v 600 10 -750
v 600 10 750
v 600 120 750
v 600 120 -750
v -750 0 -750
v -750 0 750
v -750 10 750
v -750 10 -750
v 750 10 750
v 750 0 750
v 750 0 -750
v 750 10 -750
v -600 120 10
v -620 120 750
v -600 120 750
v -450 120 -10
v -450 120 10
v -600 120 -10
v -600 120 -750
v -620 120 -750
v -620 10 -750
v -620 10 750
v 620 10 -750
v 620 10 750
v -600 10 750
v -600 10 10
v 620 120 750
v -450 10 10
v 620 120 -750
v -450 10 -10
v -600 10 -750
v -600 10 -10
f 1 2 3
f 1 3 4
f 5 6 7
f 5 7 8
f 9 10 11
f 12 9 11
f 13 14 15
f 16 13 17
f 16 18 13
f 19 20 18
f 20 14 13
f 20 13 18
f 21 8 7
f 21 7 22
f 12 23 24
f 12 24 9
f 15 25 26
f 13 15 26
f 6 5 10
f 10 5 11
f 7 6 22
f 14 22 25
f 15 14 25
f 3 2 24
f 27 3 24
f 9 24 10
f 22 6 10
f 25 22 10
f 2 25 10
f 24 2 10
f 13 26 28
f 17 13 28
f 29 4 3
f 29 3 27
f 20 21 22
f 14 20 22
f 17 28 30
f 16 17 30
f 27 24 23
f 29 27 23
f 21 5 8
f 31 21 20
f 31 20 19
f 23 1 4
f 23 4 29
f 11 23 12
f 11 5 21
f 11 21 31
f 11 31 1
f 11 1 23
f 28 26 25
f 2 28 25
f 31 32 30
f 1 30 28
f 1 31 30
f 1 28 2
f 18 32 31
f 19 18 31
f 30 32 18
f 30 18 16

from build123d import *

# Parameters (mm, degrees)
SKETCH2_W           = 1500
SKETCH2_H           = 1500
BOSS_EXTRUDE1_DEPTH = 10
SKETCH3_W           = 150
SKETCH3_H           = 20
SKETCH3_W_2         = 20
SKETCH3_H_2         = 1500
BOSS_EXTRUDE2_DEPTH = 110


with BuildPart() as part:
    # Sketch2 → Boss-Extrude1 (new body)
    with BuildSketch(Plane(origin=(0, 0, 0), x_dir=(1, 0, 0), z_dir=(0, 1, 0))):
        Rectangle(SKETCH2_W, SKETCH2_H)
    extrude(amount=BOSS_EXTRUDE1_DEPTH)

    # Sketch3 → Boss-Extrude2 (add)
    with BuildSketch(Plane(origin=(0, 10, 0), x_dir=(1, 0, 0), z_dir=(0, 1, 0))):
        Polygon((-600, 750), (-620, 750), (-620, -750), (-600, -750), (-600, -10), (-600, 10), align=None)
        with Locations((-525, 0)):
            Rectangle(SKETCH3_W, SKETCH3_H)
        with Locations((610, 0)):
            Rectangle(SKETCH3_W_2, SKETCH3_H_2)
    extrude(amount=BOSS_EXTRUDE2_DEPTH)


solid = part.part
